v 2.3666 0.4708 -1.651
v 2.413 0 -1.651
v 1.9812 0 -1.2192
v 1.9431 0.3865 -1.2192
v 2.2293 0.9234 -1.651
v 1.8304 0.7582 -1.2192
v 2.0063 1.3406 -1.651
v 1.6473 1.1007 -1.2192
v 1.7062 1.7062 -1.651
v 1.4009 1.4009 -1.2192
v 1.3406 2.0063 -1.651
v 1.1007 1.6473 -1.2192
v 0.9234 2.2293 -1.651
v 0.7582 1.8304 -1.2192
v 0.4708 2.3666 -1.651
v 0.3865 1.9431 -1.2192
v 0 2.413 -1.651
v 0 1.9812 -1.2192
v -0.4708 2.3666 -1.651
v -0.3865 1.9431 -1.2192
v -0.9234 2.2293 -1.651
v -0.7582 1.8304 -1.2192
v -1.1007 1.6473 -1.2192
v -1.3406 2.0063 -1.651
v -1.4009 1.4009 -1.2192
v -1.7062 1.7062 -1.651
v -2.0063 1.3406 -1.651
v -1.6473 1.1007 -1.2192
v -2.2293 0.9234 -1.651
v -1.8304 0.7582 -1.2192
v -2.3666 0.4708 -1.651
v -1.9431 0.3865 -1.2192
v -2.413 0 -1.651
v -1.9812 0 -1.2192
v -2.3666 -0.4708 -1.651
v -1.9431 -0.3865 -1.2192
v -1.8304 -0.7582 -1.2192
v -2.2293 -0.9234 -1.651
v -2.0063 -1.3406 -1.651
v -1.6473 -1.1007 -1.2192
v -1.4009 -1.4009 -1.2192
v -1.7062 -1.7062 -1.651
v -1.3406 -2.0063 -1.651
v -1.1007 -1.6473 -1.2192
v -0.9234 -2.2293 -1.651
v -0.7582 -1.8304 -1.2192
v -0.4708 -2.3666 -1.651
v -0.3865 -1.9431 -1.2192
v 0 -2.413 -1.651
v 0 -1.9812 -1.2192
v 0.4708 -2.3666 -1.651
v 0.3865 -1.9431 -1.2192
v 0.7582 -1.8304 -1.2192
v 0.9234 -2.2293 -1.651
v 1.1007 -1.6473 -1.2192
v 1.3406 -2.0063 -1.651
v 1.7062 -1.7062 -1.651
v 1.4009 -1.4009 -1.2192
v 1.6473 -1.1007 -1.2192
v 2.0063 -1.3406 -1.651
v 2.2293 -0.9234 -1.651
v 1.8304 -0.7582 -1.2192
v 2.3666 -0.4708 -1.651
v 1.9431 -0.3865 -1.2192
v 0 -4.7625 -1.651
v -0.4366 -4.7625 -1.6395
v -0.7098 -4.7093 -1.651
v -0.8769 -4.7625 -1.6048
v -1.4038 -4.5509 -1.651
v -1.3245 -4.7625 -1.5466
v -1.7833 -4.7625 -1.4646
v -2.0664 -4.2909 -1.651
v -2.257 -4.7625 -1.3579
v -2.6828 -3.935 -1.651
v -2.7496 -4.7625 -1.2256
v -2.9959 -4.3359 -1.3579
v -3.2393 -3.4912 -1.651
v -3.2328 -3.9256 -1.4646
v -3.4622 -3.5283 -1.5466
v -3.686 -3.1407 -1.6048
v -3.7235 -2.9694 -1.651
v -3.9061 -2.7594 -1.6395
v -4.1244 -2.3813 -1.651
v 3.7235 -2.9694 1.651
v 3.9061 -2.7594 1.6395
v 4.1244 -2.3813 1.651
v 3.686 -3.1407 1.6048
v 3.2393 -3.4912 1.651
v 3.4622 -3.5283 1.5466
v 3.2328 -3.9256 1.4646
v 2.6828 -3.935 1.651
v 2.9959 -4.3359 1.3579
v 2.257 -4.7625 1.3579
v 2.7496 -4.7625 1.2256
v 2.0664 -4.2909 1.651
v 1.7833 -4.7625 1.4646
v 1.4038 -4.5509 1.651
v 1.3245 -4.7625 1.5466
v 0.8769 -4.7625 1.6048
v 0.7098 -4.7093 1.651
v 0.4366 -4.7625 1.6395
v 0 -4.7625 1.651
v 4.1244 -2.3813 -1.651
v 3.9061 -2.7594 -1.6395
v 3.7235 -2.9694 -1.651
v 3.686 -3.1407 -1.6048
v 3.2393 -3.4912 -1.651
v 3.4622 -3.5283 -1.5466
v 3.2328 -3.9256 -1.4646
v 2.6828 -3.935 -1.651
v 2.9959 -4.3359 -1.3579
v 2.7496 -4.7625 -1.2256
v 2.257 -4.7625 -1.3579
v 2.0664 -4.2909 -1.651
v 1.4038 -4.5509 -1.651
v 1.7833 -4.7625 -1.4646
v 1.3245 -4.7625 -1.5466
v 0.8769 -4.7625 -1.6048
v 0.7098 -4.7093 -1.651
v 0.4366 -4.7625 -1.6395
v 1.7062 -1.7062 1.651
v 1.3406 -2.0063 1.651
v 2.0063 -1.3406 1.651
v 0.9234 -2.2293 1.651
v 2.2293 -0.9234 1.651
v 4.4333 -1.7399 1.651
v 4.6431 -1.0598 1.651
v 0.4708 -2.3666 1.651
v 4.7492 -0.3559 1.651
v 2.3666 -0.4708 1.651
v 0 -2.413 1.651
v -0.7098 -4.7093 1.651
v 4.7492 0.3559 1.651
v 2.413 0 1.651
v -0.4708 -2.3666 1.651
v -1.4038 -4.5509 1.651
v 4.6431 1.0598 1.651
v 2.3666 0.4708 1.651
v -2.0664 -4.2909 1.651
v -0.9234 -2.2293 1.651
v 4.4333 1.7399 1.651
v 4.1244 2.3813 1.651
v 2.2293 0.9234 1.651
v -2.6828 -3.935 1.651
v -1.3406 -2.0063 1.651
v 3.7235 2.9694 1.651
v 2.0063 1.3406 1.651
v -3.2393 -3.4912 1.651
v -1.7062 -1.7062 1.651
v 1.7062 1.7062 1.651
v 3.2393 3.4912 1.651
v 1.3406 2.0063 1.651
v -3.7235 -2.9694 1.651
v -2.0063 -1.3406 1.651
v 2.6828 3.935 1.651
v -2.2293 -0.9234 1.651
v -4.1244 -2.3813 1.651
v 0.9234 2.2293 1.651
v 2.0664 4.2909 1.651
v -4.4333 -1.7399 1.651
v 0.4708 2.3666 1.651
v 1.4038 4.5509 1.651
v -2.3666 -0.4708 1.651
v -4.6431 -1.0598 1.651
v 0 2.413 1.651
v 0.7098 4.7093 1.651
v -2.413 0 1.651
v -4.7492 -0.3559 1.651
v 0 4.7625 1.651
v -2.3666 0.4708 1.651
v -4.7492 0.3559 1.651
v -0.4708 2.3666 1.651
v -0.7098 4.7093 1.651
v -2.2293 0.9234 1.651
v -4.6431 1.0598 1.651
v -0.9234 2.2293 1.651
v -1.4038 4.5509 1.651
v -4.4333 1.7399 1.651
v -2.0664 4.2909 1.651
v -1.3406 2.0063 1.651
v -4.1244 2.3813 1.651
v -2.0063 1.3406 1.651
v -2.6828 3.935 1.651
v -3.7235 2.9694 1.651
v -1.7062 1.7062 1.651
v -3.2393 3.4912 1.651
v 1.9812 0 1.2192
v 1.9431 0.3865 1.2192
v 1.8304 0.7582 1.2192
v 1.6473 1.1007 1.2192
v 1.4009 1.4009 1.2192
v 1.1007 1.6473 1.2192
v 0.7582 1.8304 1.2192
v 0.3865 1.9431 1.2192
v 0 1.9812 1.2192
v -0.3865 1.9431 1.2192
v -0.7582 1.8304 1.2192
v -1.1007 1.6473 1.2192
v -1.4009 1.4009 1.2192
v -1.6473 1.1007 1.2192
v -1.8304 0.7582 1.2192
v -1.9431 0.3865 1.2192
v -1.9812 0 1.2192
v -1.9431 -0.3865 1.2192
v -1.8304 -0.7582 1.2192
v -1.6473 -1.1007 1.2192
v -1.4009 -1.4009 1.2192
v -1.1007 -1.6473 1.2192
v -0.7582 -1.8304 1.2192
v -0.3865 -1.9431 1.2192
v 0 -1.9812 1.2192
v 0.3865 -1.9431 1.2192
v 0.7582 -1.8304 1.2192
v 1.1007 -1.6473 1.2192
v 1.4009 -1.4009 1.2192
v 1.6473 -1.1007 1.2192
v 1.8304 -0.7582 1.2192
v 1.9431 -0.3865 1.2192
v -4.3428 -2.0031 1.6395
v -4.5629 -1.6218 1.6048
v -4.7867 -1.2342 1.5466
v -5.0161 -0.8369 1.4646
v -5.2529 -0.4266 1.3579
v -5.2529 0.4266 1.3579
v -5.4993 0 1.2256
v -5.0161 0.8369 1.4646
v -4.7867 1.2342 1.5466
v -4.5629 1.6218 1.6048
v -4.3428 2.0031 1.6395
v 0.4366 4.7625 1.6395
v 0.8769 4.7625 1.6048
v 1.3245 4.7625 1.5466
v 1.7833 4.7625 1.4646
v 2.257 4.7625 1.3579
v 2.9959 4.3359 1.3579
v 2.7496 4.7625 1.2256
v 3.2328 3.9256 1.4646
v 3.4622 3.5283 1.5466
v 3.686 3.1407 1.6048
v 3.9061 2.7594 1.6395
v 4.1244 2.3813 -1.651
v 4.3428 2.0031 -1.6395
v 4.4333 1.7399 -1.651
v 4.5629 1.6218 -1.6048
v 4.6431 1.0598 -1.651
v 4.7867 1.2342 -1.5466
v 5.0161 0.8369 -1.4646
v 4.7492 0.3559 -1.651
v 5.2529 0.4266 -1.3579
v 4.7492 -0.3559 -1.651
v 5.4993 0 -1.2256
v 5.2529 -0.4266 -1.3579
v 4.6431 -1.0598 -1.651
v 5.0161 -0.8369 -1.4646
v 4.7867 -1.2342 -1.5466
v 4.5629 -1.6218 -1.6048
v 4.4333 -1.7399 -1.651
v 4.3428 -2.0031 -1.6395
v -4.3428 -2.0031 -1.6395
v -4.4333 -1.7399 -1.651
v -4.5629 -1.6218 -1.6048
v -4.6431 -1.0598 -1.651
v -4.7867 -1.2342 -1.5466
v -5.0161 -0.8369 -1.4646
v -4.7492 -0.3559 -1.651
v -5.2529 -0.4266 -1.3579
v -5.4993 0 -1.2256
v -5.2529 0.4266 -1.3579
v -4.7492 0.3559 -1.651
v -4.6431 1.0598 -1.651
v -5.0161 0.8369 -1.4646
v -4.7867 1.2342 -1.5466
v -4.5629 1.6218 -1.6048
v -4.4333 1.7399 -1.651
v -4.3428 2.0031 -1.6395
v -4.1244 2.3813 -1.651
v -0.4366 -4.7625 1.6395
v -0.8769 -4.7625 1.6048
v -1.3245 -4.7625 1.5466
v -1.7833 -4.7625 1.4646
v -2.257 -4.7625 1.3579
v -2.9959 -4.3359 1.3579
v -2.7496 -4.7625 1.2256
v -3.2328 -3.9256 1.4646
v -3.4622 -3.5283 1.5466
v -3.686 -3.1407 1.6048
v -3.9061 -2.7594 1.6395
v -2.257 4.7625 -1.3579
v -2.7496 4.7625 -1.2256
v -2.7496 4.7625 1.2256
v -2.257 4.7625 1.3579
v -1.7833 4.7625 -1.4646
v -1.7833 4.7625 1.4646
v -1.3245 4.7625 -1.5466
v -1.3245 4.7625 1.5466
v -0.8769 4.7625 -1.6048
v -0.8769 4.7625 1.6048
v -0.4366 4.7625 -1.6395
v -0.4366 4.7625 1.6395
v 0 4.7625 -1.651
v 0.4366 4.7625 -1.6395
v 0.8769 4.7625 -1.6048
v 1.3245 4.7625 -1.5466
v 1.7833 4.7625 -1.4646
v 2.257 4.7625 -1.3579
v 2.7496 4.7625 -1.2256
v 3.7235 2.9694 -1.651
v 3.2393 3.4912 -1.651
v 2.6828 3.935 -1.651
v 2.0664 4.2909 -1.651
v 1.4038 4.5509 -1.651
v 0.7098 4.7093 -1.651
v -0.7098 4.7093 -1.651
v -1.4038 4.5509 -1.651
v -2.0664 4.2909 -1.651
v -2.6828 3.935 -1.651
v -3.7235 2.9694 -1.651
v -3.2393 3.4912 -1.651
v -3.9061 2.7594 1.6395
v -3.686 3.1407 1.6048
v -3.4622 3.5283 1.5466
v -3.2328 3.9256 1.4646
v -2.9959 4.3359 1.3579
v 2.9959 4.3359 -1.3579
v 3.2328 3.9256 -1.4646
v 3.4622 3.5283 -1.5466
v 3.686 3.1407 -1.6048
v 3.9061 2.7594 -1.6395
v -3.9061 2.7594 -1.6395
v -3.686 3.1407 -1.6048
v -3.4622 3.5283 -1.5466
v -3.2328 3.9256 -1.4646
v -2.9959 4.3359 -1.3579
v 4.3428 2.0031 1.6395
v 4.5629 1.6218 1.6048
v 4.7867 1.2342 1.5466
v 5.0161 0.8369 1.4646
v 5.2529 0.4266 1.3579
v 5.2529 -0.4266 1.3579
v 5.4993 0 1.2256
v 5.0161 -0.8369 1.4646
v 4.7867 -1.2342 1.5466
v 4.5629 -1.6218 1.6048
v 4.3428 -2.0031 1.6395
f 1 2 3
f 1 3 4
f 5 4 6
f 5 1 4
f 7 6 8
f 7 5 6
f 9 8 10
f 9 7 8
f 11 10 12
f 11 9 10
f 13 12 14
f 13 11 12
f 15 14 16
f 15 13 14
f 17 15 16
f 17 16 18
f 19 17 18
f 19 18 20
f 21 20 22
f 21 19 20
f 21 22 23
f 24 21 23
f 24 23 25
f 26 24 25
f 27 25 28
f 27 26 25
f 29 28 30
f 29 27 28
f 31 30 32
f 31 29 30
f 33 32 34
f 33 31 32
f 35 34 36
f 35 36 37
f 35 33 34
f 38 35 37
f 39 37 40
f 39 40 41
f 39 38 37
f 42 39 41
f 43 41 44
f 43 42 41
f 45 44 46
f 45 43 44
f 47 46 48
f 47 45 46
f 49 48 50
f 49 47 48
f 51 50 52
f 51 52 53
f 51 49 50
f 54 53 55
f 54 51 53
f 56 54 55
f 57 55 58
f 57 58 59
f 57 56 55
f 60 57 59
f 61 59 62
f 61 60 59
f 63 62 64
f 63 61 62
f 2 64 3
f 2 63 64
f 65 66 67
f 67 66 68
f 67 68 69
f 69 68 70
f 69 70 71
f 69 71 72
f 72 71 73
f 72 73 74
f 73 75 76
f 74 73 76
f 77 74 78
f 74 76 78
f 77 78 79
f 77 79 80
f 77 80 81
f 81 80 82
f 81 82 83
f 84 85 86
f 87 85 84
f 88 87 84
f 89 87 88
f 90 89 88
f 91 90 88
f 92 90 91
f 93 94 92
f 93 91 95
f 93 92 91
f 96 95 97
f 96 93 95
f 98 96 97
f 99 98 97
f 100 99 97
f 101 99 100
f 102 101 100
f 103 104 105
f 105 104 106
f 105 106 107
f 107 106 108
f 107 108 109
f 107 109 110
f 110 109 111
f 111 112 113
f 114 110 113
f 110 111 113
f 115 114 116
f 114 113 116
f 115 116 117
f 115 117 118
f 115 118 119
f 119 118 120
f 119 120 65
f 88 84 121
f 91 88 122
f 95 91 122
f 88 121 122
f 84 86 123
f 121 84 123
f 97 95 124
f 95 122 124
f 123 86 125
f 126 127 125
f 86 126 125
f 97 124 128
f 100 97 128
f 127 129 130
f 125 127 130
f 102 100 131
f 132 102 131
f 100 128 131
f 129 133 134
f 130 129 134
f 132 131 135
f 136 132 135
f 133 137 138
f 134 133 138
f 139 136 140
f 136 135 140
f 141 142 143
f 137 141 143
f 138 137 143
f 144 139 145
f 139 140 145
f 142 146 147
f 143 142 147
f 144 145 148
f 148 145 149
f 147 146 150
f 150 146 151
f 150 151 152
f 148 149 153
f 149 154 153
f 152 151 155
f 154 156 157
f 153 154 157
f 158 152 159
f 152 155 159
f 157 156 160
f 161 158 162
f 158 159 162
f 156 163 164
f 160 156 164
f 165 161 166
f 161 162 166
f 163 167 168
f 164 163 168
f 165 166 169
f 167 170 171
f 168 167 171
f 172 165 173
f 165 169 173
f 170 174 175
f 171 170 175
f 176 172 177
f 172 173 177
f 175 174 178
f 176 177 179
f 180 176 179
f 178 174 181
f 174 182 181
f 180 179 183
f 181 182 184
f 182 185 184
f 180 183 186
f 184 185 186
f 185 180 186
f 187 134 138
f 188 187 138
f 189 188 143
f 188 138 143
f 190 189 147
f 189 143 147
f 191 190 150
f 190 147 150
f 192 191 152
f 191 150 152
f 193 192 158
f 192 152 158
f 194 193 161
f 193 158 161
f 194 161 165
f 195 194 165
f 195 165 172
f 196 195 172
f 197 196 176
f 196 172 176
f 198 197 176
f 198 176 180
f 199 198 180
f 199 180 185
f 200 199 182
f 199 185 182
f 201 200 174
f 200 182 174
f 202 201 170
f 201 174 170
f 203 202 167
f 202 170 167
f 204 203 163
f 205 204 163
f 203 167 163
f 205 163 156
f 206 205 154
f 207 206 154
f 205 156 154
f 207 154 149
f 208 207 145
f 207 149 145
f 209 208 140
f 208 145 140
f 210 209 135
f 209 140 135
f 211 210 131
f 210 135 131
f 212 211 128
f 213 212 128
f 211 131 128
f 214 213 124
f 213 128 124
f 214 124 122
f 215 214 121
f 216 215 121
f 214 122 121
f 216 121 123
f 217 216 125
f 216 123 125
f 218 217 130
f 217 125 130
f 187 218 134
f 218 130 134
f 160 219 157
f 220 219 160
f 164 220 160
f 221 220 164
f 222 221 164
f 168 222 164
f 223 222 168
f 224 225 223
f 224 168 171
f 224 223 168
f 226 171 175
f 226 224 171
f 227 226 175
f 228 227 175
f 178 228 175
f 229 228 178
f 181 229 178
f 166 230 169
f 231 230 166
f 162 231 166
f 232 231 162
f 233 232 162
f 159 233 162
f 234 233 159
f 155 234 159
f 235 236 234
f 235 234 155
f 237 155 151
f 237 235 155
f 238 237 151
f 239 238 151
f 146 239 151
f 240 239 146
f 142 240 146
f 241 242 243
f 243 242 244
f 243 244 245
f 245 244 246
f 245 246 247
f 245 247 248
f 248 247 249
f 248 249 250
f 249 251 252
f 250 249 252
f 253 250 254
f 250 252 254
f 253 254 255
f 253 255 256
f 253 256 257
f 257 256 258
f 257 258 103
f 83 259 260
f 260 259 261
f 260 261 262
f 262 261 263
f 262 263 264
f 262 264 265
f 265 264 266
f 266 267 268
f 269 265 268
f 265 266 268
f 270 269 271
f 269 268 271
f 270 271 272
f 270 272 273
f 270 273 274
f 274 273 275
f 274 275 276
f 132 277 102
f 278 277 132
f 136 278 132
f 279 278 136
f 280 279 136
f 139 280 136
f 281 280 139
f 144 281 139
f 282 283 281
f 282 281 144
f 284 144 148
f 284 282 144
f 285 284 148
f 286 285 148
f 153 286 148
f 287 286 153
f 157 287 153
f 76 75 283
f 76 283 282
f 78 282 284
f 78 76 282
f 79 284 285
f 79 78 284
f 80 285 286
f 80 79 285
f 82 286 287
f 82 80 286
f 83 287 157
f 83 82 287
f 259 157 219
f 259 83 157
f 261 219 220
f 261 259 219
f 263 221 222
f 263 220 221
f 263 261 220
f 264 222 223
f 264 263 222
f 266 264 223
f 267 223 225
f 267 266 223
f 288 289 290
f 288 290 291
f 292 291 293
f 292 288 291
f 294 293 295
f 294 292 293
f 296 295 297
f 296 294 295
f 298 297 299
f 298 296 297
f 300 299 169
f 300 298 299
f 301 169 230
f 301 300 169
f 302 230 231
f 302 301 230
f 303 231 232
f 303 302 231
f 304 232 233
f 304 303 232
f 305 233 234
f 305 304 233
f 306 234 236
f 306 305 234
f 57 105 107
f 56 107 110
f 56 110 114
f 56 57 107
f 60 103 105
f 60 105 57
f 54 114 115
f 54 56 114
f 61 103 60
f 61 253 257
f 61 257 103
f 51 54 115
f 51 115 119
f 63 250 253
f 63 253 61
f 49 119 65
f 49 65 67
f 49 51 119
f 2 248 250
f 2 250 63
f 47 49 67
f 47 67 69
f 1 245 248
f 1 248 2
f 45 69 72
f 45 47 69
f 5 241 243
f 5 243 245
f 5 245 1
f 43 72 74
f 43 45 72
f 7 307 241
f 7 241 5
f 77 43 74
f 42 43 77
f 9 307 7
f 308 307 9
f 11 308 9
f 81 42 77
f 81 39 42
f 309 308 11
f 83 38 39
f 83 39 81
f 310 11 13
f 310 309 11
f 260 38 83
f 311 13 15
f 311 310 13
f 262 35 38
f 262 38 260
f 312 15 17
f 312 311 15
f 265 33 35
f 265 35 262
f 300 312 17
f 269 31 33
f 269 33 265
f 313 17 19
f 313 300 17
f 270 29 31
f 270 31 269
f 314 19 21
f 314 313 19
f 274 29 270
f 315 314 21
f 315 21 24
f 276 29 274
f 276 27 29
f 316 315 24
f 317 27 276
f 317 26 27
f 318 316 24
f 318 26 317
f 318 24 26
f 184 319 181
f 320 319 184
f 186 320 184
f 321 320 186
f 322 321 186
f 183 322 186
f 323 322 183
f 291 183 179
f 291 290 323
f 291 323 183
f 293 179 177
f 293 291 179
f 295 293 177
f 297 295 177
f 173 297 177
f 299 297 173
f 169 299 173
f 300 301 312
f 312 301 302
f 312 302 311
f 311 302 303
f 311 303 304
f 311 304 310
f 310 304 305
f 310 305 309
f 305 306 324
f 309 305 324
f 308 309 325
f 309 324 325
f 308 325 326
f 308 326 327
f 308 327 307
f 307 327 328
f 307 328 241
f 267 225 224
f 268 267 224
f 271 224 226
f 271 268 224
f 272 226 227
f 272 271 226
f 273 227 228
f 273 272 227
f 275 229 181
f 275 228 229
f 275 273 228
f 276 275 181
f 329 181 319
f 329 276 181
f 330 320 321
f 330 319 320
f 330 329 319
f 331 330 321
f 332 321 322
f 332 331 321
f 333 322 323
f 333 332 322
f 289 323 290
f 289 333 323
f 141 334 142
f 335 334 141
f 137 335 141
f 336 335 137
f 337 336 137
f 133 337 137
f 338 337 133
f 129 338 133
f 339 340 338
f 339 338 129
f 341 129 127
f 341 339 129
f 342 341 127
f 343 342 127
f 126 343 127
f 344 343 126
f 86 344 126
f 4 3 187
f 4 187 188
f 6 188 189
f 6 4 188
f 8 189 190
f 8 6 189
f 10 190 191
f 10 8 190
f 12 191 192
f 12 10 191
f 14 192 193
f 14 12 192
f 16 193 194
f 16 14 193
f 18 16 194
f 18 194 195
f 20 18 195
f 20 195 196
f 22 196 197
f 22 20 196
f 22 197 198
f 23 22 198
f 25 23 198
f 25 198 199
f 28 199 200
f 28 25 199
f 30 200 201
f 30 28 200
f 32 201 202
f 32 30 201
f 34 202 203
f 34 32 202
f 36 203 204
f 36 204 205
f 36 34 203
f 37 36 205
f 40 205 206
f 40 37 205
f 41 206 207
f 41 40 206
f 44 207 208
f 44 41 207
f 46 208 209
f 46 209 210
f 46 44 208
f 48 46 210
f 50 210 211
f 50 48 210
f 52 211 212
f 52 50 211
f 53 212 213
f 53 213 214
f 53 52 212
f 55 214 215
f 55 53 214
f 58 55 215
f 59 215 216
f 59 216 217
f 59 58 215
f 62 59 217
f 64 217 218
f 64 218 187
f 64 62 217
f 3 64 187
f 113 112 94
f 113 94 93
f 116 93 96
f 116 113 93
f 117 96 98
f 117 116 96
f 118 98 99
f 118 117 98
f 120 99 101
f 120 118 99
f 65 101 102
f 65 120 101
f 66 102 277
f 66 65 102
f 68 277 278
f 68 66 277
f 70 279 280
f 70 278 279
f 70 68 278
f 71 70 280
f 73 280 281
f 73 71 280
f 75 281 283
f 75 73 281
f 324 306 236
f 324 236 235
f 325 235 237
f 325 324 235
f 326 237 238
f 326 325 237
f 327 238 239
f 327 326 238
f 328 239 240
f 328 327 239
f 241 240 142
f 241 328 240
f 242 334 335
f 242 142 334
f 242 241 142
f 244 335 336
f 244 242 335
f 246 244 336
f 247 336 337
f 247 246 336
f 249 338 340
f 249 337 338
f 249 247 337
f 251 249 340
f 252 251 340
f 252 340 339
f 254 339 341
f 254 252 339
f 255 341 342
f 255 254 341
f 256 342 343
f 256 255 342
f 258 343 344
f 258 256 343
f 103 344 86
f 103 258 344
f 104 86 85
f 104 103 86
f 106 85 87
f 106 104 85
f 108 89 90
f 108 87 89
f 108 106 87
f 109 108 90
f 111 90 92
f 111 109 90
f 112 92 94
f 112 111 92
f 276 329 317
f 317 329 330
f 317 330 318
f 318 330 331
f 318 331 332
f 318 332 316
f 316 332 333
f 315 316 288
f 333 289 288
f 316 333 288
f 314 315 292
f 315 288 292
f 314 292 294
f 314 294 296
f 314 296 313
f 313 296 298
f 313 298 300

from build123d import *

# Parameters (mm, degrees)
BOSS_EXTRUDE1_DEPTH = 1.651


with BuildPart() as part:
    # Sketch1 → Boss-Extrude1 (new body, symmetric)
    with BuildSketch(Plane(origin=(0, 1.651, 0), x_dir=(-1, 0, 0), z_dir=(0, 0, -1))):
        Polygon((2.749630657, 3.1115), (-2.749630657, 3.1115), (-5.499261314, -1.651), (-2.749630657, -6.4135), (2.749630657, -6.4135), (5.499261314, -1.651), align=None)
    extrude(amount=BOSS_EXTRUDE1_DEPTH, both=True)

    # Sketch2 → Cut-Revolve1 (revolve, cut)
    with BuildSketch(Plane(origin=(0, 0, 0), x_dir=(-1, 0, 0), z_dir=(0, 1, 0))):
        Polygon((-5.499261314, -1.225630657), (-5.499261314, -1.651), (-4.7625, -1.651), align=None)
    cut_revolve1 = revolve(axis=Axis((0, 0, 0), (0, 0, -1)), mode=Mode.SUBTRACT)

    # Sketch4 → Cut-Revolve3 (revolve, cut)
    with BuildSketch(Plane(origin=(0, 0, 0), x_dir=(1, 0, 0), z_dir=(0, 1, 0))):
        Polygon((2.413, 1.651), (0, 1.651), (0, -1.2192), (1.9812, -1.2192), (1.9812, 1.2192), align=None)
    cut_revolve3 = revolve(axis=Axis((0, 0, -1.651), (0, 0, 1)), mode=Mode.SUBTRACT)

    # Mirror1: Cut-Revolve1, Cut-Revolve3 across plane
    add(cut_revolve1.mirror(Plane.XY), mode=Mode.SUBTRACT)
    add(cut_revolve3.mirror(Plane.XY), mode=Mode.SUBTRACT)


solid = part.part
